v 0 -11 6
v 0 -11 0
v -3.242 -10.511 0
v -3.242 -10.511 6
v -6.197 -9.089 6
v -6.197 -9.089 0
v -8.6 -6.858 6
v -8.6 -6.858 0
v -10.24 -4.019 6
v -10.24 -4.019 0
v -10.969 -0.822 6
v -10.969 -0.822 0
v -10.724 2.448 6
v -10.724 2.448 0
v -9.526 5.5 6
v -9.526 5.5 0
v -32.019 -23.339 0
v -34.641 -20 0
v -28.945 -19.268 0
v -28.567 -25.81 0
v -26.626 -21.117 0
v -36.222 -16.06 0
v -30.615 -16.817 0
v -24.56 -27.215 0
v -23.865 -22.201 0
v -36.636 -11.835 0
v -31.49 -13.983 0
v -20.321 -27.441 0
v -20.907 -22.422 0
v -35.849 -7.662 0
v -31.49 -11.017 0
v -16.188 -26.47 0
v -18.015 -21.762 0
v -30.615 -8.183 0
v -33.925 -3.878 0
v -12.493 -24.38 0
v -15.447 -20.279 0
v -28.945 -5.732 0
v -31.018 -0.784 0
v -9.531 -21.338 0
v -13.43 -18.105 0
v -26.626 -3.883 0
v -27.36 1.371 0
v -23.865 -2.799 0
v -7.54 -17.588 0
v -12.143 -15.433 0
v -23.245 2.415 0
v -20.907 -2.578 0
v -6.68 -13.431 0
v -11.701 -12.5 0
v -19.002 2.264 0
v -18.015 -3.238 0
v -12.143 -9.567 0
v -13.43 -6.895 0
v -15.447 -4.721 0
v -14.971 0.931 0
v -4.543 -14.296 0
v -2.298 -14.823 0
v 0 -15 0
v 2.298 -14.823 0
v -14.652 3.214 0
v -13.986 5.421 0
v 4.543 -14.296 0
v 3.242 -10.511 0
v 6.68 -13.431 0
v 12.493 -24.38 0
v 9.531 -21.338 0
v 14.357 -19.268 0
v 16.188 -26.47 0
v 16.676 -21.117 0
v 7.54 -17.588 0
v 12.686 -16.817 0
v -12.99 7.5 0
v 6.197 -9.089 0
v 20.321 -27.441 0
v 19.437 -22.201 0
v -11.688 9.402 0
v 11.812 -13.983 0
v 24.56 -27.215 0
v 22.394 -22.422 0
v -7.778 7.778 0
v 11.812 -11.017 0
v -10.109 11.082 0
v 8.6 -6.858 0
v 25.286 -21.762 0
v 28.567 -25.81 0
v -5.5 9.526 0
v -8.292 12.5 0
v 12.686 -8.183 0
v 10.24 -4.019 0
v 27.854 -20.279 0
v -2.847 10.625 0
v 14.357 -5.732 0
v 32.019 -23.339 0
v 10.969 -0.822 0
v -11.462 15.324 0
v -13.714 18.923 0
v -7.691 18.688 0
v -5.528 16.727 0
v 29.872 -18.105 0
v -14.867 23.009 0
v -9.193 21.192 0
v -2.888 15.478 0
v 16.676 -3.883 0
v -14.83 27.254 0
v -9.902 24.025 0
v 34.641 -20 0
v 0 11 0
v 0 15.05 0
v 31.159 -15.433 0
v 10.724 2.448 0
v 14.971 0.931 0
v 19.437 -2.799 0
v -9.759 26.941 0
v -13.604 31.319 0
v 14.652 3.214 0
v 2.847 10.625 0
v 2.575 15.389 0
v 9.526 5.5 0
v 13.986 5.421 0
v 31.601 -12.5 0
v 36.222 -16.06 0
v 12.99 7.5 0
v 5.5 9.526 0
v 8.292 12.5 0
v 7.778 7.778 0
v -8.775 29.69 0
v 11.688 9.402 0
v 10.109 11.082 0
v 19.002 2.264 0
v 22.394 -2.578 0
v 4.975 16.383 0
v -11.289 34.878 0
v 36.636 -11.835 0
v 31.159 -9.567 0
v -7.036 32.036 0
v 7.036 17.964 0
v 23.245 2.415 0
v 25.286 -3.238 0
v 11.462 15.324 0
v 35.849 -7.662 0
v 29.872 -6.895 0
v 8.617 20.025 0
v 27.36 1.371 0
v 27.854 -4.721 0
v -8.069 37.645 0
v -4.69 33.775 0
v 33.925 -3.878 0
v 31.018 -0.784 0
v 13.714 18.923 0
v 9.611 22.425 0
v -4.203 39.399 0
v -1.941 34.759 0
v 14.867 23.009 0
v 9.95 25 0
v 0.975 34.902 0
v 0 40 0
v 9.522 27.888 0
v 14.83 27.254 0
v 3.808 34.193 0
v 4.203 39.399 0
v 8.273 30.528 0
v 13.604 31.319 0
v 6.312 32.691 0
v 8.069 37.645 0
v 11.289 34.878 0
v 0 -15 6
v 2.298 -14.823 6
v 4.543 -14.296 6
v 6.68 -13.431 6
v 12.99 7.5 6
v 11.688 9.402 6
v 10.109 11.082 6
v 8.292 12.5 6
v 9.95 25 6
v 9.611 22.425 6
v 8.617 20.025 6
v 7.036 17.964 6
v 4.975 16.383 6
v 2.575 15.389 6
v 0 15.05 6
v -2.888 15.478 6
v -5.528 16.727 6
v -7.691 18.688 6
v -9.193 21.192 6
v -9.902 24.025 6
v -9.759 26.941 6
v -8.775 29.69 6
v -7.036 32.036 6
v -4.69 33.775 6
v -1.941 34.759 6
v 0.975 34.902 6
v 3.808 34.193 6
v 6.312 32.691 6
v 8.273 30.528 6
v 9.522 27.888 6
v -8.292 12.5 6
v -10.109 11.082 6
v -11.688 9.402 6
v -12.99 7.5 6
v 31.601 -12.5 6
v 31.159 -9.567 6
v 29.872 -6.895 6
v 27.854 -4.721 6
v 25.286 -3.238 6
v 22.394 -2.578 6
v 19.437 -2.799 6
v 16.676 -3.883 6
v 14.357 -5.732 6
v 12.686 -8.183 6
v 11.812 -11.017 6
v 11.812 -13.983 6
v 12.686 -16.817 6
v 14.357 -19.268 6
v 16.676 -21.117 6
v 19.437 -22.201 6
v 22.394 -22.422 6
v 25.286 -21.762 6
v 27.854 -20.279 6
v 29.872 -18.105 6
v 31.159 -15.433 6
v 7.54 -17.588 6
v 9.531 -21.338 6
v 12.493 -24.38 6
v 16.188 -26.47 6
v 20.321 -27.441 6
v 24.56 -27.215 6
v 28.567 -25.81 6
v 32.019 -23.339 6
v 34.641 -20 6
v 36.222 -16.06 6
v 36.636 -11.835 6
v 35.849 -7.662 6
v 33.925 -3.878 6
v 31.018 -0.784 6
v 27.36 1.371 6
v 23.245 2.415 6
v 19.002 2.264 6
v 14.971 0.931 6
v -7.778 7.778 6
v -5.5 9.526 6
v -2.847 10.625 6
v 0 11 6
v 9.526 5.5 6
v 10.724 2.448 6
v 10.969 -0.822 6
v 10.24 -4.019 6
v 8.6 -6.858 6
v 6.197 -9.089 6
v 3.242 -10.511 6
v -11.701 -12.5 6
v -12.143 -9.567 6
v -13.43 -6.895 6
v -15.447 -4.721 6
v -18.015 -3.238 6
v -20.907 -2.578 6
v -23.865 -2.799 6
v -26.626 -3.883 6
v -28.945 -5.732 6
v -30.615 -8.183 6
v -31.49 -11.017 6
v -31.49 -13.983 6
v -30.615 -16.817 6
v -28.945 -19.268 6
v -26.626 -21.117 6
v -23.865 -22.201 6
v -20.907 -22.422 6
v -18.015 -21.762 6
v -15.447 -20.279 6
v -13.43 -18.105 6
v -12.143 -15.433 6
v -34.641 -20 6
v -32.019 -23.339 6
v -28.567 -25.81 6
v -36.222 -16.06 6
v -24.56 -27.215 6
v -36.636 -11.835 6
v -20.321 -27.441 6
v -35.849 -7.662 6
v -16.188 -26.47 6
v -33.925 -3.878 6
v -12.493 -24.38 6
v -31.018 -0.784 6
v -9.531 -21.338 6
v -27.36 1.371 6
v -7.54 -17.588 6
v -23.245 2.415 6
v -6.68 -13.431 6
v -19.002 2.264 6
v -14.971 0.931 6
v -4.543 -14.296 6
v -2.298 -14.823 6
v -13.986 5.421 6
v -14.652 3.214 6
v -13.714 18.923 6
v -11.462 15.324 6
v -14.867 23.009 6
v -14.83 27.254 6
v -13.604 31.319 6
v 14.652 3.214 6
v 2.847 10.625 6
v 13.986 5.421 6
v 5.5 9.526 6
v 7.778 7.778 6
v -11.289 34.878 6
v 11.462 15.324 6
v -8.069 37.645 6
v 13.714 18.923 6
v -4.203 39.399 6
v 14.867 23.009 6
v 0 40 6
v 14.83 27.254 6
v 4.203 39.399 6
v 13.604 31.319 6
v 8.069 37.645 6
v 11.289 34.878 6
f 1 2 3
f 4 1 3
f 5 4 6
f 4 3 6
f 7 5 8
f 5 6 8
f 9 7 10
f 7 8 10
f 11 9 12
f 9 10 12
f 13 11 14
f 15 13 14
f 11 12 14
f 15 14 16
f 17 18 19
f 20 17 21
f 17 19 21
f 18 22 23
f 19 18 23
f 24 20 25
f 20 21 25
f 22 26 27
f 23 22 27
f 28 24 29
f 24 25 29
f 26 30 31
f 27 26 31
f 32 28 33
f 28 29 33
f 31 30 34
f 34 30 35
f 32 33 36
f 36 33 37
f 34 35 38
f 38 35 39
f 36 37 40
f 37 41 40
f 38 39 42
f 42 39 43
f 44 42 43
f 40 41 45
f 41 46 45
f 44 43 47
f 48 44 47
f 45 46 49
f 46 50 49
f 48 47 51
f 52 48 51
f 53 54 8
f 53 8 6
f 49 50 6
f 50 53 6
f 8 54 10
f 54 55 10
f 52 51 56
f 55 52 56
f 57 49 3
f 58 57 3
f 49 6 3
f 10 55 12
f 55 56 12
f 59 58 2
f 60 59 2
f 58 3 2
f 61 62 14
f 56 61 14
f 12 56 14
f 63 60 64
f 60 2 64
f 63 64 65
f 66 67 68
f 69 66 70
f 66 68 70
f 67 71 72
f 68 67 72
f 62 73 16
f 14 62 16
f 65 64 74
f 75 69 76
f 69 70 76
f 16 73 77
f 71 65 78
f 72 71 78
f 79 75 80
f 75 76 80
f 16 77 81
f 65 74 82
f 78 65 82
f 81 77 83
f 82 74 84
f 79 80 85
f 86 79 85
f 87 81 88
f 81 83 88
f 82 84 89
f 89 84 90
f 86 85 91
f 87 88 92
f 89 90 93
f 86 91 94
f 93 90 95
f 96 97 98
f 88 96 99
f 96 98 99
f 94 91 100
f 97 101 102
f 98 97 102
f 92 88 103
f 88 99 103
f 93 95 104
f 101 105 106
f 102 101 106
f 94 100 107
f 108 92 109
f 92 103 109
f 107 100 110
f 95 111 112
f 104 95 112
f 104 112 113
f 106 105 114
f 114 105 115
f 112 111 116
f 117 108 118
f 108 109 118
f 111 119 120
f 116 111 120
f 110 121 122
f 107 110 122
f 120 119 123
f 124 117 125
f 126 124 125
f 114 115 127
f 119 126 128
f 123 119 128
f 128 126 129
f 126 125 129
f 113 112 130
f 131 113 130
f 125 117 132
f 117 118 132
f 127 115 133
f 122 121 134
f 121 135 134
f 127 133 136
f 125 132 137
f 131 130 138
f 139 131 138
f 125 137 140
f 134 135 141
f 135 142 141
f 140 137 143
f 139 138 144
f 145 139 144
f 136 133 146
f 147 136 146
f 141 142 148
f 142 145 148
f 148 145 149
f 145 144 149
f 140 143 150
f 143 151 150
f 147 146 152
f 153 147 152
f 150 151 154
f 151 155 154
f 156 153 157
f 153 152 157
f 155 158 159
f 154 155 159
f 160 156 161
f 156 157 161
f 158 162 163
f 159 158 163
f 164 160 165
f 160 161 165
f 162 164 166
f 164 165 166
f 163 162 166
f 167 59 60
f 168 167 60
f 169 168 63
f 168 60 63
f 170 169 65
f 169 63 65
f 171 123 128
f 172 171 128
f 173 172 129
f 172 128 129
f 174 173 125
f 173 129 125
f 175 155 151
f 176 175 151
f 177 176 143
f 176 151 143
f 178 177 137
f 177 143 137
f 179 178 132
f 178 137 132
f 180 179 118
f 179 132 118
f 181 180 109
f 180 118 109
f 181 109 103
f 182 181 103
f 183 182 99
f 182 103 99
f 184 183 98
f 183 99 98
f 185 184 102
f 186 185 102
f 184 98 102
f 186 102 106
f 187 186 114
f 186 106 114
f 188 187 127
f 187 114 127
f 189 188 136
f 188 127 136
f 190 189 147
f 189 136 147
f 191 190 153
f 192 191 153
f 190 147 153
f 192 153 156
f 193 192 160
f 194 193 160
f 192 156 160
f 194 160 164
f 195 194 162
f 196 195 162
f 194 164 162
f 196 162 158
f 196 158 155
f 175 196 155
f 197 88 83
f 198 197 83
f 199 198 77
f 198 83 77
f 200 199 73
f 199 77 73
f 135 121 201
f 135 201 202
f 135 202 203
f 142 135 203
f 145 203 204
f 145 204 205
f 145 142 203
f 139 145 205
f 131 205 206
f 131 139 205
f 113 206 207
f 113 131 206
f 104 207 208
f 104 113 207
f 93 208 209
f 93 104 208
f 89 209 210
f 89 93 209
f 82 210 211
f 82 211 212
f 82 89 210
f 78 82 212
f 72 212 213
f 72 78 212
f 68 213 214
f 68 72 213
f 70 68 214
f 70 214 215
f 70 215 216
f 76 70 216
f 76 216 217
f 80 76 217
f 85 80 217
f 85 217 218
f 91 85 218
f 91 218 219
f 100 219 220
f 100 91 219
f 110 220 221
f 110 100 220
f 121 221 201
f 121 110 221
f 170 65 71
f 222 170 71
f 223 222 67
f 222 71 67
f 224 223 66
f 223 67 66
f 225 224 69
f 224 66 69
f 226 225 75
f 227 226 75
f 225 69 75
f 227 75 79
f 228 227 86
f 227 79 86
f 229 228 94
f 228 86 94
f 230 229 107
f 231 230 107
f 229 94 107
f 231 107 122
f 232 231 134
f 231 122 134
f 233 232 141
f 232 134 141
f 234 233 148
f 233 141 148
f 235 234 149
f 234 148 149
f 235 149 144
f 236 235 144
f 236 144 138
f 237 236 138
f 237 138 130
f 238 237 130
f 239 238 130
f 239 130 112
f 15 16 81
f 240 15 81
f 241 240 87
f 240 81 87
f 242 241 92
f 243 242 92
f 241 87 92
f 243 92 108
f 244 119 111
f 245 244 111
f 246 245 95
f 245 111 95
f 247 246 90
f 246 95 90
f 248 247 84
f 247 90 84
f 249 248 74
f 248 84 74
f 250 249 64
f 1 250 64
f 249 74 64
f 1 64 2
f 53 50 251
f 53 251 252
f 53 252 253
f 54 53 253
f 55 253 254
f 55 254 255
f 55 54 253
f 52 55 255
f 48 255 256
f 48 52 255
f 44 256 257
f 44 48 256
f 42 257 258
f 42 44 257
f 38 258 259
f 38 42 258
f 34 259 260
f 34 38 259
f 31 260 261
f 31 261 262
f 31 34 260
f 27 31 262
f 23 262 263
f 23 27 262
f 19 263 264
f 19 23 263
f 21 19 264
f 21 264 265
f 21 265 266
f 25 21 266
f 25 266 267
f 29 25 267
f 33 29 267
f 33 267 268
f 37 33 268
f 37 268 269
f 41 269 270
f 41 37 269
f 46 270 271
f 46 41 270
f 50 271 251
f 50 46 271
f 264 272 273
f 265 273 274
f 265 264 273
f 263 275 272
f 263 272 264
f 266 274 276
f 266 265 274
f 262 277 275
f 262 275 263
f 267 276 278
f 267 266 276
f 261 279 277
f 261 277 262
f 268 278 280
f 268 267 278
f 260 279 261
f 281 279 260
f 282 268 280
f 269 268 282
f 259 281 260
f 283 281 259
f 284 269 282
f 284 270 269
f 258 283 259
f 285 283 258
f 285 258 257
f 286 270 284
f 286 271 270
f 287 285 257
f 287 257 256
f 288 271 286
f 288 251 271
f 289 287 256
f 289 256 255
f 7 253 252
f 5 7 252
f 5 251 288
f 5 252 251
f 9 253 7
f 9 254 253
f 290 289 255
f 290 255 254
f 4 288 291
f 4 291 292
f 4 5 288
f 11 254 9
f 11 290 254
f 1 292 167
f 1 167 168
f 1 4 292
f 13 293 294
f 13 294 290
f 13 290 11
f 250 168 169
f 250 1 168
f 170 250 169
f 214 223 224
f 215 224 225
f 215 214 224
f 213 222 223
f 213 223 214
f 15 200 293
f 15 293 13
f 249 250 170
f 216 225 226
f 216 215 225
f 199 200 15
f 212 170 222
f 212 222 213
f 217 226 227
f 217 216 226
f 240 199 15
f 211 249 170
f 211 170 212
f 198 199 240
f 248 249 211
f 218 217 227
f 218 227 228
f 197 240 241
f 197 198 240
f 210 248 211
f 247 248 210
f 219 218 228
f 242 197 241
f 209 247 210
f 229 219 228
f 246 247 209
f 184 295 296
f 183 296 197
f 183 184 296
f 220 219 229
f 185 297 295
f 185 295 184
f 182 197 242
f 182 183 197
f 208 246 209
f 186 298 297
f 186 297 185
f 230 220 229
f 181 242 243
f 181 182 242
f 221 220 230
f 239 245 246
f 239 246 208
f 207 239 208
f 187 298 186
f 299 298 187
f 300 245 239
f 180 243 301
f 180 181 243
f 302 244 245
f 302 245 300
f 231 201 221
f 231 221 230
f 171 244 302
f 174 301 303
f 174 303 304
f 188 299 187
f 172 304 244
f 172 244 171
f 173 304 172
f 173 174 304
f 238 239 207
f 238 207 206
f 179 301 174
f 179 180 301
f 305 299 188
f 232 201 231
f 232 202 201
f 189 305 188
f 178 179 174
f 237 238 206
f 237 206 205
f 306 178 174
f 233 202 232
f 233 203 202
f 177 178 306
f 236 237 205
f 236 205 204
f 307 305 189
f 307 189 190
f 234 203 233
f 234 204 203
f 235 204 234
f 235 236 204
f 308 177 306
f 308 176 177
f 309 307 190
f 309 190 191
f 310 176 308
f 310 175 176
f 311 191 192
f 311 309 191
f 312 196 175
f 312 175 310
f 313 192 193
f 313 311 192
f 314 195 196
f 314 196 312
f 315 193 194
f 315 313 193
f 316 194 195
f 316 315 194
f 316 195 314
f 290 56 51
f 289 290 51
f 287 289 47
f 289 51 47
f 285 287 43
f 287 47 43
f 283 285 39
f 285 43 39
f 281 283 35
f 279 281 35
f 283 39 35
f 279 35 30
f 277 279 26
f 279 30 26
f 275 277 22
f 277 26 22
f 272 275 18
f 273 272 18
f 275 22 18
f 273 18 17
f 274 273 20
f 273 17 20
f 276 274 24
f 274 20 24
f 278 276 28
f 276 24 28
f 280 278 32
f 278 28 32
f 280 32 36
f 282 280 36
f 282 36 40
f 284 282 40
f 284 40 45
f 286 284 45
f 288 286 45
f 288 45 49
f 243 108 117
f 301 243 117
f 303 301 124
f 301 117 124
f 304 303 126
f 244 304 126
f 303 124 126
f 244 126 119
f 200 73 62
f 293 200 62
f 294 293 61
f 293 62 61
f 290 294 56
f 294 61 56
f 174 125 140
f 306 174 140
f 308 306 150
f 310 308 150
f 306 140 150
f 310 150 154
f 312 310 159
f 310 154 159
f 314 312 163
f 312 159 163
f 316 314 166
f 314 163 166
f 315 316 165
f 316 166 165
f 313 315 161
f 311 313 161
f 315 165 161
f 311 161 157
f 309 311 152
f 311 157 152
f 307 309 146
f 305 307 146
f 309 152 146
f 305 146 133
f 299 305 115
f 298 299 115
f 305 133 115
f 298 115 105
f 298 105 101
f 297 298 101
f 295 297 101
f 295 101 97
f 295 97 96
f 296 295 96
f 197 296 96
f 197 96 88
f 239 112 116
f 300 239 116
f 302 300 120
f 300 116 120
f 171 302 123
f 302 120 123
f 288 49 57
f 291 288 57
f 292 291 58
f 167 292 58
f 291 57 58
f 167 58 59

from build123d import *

# Parameters (mm, degrees)
F0_R     = 9.95
F1_DEPTH = 6


# Not quite as in the source:
# - a feature names something its author has since deleted; it is built from what else it names


with BuildPart() as f1:
    # F0 (on Top) → F1 (new body)
    with BuildSketch(Plane.XY):
        with BuildLine():
            ThreePointArc((8.2915619759, 12.5), (0, 40), (-8.2915619759, 12.5))
            ThreePointArc((-8.2915619759, 12.5), (-10.9307033082, 10.2722794544), (-12.9903810568, 7.5))
            ThreePointArc((-12.9903810568, 7.5), (-14.3614066163, 4.3301270189), (-14.9710985352, 0.9307033082))
            ThreePointArc((-14.9710985352, 0.9307033082), (-34.6410161514, -20), (-6.6795365594, -13.4307033082))
            ThreePointArc((-6.6795365594, -13.4307033082), (-3.4307033082, -14.6024064733), (0, -15))
            ThreePointArc((0, -15), (3.4307033082, -14.6024064733), (6.6795365594, -13.4307033082))
            ThreePointArc((6.6795365594, -13.4307033082), (34.6410161514, -20), (14.9710985352, 0.9307033082))
            ThreePointArc((14.9710985352, 0.9307033082), (14.3614066163, 4.3301270189), (12.9903810568, 7.5))
            ThreePointArc((12.9903810568, 7.5), (10.9307033082, 10.2722794544), (8.2915619759, 12.5))
        make_face()
        with Locations((-21.6506350946, -12.5)):
            Circle(F0_R, mode=Mode.SUBTRACT)
        with Locations((21.6506350946, -12.5)):
            Circle(F0_R, mode=Mode.SUBTRACT)
        with BuildLine():
            ThreePointArc((0, 11), (5.5, 9.5262794416), (9.5262794416, 5.5))
            ThreePointArc((9.5262794416, 5.5), (9.5262794416, -5.5), (0, -11))
            ThreePointArc((0, -11), (-9.5262794416, -5.5), (-9.5262794416, 5.5))
            ThreePointArc((-9.5262794416, 5.5), (-5.5, 9.5262794416), (0, 11))
        make_face(mode=Mode.SUBTRACT)
        with BuildLine():
            ThreePointArc((9.95, 25), (7.0357124728, 17.9642875272), (0, 15.05))
            ThreePointArc((0, 15.05), (-7.0357124728, 32.0357124728), (9.95, 25))
        make_face(mode=Mode.SUBTRACT)
    extrude(amount=F1_DEPTH)


solid = f1.part
